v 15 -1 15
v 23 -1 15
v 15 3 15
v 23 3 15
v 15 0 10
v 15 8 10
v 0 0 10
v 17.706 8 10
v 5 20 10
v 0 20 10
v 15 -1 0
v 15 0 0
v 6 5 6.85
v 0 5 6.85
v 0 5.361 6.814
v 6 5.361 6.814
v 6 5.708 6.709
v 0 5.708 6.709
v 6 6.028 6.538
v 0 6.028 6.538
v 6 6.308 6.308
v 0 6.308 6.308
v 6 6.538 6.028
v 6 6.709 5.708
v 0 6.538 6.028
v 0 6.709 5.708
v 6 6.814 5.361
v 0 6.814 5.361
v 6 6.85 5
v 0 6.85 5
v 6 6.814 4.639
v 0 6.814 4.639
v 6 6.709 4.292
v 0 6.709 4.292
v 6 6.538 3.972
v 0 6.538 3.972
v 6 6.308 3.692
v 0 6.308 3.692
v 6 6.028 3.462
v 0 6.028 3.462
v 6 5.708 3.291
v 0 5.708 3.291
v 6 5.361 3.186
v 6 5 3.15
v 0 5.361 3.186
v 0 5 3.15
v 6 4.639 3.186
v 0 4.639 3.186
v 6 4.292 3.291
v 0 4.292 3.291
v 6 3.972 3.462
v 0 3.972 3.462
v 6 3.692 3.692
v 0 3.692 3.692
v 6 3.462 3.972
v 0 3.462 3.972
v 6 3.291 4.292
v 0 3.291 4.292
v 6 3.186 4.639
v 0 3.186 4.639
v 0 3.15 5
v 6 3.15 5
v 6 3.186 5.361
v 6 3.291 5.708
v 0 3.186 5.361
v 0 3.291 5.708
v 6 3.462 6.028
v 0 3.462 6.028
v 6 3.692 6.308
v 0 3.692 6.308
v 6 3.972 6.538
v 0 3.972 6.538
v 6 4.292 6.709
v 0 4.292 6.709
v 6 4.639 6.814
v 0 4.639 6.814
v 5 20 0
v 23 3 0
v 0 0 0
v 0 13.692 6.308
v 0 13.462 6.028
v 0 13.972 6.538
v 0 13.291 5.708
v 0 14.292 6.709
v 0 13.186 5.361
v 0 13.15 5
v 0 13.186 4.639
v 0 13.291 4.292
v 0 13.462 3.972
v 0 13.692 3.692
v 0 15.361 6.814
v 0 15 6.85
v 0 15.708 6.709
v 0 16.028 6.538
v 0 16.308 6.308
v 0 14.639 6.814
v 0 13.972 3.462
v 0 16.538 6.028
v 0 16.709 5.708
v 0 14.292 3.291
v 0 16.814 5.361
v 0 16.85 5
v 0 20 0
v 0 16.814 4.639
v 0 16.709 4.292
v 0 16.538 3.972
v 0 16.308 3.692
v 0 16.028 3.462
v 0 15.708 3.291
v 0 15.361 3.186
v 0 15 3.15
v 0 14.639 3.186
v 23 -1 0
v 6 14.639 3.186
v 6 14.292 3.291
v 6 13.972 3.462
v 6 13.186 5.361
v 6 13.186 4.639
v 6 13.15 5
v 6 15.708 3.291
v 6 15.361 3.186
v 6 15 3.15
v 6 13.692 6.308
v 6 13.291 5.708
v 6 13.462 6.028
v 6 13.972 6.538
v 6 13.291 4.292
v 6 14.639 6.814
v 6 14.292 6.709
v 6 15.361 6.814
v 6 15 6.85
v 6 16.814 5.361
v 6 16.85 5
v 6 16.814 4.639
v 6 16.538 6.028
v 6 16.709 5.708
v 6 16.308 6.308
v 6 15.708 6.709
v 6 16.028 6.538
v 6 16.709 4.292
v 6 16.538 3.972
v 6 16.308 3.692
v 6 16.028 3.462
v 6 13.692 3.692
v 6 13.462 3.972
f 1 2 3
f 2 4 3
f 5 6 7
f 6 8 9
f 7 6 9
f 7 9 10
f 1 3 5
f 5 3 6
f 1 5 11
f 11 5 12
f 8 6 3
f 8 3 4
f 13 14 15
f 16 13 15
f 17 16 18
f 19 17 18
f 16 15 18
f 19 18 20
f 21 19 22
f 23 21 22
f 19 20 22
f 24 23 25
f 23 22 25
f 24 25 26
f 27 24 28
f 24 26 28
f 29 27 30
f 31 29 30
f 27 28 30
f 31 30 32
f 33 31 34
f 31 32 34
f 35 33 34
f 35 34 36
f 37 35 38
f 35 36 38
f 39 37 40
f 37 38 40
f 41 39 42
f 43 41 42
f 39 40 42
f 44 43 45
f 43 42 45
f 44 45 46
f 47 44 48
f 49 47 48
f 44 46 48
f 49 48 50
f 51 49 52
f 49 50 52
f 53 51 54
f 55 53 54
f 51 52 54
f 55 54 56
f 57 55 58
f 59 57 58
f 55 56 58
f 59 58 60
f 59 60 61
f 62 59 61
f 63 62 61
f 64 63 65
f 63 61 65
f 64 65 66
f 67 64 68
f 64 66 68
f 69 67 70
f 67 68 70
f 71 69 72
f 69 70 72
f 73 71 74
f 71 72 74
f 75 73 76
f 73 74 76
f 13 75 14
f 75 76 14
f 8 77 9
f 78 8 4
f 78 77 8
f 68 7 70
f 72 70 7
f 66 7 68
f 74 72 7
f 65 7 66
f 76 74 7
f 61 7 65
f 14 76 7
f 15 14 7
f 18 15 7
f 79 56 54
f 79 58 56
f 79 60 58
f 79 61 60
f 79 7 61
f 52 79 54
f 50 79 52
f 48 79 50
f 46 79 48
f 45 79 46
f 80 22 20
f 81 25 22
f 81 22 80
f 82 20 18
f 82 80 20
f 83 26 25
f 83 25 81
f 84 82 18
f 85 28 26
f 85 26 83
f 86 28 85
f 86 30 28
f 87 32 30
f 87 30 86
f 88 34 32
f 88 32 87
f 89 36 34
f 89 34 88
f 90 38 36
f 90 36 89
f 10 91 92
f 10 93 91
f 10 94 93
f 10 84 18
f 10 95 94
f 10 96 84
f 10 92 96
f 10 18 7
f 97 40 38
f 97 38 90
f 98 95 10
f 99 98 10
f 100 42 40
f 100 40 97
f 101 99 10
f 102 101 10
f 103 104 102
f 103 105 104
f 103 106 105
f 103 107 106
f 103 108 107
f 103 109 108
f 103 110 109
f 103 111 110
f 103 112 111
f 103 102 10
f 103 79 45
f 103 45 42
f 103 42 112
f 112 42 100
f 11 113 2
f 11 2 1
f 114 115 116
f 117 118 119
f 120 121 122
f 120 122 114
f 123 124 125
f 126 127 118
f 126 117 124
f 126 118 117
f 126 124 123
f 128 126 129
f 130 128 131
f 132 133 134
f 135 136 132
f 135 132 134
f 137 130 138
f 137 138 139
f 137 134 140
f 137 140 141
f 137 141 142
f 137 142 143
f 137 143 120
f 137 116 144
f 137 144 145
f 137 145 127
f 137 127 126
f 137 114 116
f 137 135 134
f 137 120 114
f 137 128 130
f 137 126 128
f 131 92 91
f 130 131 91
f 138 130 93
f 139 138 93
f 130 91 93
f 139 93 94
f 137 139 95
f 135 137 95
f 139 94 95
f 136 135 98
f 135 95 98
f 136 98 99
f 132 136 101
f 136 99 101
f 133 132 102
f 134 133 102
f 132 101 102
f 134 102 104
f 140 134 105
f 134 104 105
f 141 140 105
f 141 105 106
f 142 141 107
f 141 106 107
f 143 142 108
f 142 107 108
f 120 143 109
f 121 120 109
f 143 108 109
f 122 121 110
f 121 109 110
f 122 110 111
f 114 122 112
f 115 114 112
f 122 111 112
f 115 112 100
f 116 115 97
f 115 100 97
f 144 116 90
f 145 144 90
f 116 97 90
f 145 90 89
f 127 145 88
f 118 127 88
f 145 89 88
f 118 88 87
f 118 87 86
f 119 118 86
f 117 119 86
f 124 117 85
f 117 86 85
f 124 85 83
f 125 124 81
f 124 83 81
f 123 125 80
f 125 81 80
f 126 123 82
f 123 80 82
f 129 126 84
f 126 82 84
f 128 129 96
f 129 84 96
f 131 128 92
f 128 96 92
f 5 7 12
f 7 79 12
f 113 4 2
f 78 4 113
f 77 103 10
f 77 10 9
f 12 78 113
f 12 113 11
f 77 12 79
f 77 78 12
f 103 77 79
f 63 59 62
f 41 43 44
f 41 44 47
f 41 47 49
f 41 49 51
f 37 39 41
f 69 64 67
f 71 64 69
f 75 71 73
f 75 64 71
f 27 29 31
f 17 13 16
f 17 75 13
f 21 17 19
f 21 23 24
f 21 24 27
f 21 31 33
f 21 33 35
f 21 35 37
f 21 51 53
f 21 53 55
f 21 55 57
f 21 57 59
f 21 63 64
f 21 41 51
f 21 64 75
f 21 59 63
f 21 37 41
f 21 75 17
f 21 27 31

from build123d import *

# Parameters (mm, degrees)
EXTRUDE_1_DEPTH     = 10
SKETCH_2_R          = 1.85
CUT_EXTRUDE_1_DEPTH = 6
SKETCH_3_W          = 8
SKETCH_3_H          = 3
EXTRUDE_2_DEPTH     = 5
CHAMFER_2_SIZE      = 5
SKETCH_4_W          = 8
SKETCH_4_H          = 15
EXTRUDE_3_DEPTH     = 1


with BuildPart() as part:
    # ｽｹｯﾁ1 → ﾎﾞｽ - 押し出し1 (new body)
    with BuildSketch(Plane.XY):
        Polygon((0, 0), (0, 20), (5, 20), (23, 3), (23, 0), align=None)
    extrude(amount=EXTRUDE_1_DEPTH)

    # ｽｹｯﾁ2 → ｶｯﾄ - 押し出し1 (cut)
    with BuildSketch(Plane.ZY):
        with Locations((5, 15)):
            Circle(SKETCH_2_R)
        with Locations((5, 5)):
            Circle(SKETCH_2_R)
    extrude(amount=-CUT_EXTRUDE_1_DEPTH, mode=Mode.SUBTRACT)

    # ｽｹｯﾁ3 → ﾎﾞｽ - 押し出し2 (add)
    with BuildSketch(Plane.XY.offset(10)):
        with Locations((19, 1.5)):
            Rectangle(SKETCH_3_W, SKETCH_3_H)
    extrude(amount=EXTRUDE_2_DEPTH)

    # 面取り2
    chamfer_2_edges = [part.edges().sort_by_distance(p)[0] for p in [
        (19, 3, 10),
    ]]
    chamfer(chamfer_2_edges, length=CHAMFER_2_SIZE - 0.0001)  # a hair under: the kernel refuses the full size

    # ｽｹｯﾁ4 → ﾎﾞｽ - 押し出し3 (add)
    with BuildSketch(Plane(origin=(0, 0, 0), x_dir=(-1, 0, 0), z_dir=(0, -1, 0))):
        with Locations((-19, -7.5)):
            Rectangle(SKETCH_4_W, SKETCH_4_H)
    extrude(amount=EXTRUDE_3_DEPTH)


solid = part.part
